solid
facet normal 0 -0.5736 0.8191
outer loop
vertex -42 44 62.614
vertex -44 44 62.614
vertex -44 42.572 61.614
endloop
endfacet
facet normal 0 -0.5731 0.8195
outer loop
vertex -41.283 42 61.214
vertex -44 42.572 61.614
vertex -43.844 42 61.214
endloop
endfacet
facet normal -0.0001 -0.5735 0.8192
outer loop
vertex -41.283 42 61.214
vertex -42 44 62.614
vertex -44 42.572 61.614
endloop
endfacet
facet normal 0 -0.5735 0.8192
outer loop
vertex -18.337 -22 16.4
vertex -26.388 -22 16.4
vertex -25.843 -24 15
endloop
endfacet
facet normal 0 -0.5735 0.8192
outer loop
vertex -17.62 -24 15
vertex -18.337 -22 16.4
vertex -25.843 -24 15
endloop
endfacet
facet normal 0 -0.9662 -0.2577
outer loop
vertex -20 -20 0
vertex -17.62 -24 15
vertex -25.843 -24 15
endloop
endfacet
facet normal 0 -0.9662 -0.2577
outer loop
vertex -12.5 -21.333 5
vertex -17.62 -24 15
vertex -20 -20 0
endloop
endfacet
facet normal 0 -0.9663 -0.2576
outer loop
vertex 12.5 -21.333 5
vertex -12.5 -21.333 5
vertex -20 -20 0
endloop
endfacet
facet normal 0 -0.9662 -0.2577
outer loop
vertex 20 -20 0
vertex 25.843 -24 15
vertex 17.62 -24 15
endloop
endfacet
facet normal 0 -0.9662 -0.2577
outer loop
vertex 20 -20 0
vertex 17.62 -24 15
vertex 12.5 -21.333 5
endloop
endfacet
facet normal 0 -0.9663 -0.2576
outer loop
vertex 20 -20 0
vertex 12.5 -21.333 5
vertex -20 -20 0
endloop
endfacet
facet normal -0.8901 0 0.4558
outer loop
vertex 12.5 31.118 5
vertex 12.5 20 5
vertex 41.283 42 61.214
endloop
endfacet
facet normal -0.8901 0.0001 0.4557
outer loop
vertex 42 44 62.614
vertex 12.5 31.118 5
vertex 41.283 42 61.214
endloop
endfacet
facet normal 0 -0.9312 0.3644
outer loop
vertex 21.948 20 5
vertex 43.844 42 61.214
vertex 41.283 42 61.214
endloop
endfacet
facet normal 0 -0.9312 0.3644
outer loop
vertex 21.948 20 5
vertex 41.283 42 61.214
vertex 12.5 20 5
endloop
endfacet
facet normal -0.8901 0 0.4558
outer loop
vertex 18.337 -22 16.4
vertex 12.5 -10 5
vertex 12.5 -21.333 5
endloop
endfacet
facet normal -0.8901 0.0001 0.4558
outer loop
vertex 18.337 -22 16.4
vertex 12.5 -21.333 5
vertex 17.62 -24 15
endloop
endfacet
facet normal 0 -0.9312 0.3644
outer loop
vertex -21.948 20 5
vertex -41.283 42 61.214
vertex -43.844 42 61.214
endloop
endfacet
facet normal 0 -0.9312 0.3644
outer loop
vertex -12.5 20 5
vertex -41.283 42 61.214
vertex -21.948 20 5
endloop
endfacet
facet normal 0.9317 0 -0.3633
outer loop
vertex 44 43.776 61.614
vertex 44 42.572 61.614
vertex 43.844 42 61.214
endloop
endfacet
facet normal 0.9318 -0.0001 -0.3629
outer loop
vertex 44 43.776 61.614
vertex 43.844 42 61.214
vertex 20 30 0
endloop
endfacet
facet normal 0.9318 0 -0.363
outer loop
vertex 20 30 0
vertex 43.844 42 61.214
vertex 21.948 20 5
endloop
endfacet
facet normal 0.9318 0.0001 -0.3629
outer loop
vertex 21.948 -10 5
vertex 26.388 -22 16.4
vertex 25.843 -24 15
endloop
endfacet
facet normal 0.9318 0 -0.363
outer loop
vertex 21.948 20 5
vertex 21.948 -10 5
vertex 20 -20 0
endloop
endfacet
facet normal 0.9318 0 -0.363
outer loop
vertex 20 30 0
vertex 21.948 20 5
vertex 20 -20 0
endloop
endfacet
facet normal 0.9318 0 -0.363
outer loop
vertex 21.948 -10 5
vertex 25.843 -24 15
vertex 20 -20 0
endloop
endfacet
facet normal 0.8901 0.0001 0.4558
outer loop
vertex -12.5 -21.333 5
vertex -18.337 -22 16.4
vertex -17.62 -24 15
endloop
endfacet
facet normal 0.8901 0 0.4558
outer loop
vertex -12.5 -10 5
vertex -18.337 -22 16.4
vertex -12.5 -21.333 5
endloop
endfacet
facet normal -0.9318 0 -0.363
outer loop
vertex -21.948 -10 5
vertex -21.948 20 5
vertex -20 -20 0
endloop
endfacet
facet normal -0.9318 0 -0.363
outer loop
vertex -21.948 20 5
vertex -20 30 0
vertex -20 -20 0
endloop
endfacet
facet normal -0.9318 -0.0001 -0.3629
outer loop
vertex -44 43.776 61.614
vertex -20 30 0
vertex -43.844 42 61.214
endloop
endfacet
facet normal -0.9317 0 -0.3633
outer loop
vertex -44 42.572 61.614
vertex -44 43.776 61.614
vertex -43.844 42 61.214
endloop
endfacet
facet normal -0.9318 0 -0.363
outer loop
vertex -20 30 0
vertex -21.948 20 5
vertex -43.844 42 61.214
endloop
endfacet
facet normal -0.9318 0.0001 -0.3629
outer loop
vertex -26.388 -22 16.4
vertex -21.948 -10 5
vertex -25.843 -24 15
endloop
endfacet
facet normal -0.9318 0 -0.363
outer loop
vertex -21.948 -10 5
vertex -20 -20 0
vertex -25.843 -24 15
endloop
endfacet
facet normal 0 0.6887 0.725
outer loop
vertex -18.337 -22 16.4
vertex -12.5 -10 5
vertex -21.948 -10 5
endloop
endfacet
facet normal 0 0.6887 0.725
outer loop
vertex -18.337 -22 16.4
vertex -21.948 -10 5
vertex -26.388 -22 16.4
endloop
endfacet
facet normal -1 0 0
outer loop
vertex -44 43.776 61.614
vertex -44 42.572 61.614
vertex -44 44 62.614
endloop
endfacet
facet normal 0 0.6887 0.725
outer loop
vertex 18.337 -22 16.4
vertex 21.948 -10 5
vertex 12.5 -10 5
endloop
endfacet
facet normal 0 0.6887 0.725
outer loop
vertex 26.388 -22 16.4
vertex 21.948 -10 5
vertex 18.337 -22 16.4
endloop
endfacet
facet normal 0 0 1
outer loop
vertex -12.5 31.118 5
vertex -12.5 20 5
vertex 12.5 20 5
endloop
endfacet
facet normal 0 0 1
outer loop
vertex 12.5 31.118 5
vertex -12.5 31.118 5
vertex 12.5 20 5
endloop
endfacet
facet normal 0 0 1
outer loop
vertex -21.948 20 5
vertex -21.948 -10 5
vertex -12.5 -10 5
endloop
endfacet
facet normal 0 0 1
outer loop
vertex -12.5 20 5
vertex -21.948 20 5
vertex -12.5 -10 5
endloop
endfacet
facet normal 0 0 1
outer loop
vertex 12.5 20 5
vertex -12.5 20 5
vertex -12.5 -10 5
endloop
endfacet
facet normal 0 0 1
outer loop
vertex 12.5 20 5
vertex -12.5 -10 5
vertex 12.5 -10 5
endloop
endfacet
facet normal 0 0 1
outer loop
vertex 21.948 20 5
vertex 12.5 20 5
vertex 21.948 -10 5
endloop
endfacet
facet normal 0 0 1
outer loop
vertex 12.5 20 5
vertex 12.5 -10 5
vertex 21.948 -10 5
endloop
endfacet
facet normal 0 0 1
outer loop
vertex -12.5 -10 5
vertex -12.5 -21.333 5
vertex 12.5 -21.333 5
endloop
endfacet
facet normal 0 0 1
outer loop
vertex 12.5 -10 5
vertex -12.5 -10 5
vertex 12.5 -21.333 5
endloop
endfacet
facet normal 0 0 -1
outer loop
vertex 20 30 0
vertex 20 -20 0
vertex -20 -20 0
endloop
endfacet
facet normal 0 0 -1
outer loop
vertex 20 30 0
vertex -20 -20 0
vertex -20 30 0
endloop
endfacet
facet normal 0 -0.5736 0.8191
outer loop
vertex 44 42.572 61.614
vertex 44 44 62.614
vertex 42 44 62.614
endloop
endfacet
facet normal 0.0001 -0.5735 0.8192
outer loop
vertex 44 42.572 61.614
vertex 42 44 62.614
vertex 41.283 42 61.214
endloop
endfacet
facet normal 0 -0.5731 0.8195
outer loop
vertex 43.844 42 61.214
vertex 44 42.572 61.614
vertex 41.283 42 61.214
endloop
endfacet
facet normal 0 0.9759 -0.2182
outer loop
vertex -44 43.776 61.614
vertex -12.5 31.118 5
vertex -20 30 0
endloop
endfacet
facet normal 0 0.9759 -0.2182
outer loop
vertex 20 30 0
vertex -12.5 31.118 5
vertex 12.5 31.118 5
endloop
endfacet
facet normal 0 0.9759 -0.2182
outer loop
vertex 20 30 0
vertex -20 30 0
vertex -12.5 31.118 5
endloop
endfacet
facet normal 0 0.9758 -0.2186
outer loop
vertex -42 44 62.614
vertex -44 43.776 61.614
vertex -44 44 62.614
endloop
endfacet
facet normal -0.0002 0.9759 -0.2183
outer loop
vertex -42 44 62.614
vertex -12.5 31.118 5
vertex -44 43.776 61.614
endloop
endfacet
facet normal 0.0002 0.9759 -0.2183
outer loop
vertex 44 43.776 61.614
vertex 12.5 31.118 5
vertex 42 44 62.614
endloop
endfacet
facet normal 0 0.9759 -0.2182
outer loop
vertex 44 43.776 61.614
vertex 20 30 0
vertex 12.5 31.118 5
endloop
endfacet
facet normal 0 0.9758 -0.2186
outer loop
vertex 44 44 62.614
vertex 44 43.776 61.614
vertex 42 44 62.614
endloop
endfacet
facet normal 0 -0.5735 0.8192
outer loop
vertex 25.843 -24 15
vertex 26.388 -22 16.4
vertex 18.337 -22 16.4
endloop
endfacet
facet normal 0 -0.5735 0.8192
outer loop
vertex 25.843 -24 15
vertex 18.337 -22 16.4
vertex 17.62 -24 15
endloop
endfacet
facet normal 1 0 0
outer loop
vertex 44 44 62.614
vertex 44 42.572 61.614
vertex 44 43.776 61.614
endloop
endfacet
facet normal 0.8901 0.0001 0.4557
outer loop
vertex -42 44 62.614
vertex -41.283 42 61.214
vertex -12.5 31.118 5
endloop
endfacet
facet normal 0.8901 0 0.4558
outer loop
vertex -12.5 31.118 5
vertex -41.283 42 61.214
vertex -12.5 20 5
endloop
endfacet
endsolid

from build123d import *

# Parameters (mm, degrees)
PAD_DEPTH         = 44
SKETCH001_R       = 150
POCKET_DEPTH      = 44.001
POCKET_DEPTH_BACK = -24.001


with BuildPart() as part:
    # Sketch → Pad (new body, symmetric)
    with BuildSketch(Plane.YZ):
        Polygon((30, 0), (44, 62.614113), (42, 61.213698), (20, 5), (-10, 5), (-22, 16.400415), (-24, 15), (-20, 0), align=None)
    extrude(amount=PAD_DEPTH, both=True)

    # Sketch001 → Pocket (cut, two sides)
    with BuildSketch(Plane(origin=(0, 0, 0), x_dir=(0, 0, -1), z_dir=(0, -1, 0))) as pocket_sk:
        Circle(SKETCH001_R)
        Polygon((0, -20), (-61.614113, -44), (-62.614113, -44), (-62.614113, -42), (-5, -12.5), (-5, 12.5), (-62.614113, 42), (-62.614113, 44), (-61.614113, 44), (0, 20), align=None, mode=Mode.SUBTRACT)
    extrude(amount=-POCKET_DEPTH, mode=Mode.SUBTRACT)
    extrude(pocket_sk.sketch, amount=-POCKET_DEPTH_BACK, mode=Mode.SUBTRACT)


solid = part.part
